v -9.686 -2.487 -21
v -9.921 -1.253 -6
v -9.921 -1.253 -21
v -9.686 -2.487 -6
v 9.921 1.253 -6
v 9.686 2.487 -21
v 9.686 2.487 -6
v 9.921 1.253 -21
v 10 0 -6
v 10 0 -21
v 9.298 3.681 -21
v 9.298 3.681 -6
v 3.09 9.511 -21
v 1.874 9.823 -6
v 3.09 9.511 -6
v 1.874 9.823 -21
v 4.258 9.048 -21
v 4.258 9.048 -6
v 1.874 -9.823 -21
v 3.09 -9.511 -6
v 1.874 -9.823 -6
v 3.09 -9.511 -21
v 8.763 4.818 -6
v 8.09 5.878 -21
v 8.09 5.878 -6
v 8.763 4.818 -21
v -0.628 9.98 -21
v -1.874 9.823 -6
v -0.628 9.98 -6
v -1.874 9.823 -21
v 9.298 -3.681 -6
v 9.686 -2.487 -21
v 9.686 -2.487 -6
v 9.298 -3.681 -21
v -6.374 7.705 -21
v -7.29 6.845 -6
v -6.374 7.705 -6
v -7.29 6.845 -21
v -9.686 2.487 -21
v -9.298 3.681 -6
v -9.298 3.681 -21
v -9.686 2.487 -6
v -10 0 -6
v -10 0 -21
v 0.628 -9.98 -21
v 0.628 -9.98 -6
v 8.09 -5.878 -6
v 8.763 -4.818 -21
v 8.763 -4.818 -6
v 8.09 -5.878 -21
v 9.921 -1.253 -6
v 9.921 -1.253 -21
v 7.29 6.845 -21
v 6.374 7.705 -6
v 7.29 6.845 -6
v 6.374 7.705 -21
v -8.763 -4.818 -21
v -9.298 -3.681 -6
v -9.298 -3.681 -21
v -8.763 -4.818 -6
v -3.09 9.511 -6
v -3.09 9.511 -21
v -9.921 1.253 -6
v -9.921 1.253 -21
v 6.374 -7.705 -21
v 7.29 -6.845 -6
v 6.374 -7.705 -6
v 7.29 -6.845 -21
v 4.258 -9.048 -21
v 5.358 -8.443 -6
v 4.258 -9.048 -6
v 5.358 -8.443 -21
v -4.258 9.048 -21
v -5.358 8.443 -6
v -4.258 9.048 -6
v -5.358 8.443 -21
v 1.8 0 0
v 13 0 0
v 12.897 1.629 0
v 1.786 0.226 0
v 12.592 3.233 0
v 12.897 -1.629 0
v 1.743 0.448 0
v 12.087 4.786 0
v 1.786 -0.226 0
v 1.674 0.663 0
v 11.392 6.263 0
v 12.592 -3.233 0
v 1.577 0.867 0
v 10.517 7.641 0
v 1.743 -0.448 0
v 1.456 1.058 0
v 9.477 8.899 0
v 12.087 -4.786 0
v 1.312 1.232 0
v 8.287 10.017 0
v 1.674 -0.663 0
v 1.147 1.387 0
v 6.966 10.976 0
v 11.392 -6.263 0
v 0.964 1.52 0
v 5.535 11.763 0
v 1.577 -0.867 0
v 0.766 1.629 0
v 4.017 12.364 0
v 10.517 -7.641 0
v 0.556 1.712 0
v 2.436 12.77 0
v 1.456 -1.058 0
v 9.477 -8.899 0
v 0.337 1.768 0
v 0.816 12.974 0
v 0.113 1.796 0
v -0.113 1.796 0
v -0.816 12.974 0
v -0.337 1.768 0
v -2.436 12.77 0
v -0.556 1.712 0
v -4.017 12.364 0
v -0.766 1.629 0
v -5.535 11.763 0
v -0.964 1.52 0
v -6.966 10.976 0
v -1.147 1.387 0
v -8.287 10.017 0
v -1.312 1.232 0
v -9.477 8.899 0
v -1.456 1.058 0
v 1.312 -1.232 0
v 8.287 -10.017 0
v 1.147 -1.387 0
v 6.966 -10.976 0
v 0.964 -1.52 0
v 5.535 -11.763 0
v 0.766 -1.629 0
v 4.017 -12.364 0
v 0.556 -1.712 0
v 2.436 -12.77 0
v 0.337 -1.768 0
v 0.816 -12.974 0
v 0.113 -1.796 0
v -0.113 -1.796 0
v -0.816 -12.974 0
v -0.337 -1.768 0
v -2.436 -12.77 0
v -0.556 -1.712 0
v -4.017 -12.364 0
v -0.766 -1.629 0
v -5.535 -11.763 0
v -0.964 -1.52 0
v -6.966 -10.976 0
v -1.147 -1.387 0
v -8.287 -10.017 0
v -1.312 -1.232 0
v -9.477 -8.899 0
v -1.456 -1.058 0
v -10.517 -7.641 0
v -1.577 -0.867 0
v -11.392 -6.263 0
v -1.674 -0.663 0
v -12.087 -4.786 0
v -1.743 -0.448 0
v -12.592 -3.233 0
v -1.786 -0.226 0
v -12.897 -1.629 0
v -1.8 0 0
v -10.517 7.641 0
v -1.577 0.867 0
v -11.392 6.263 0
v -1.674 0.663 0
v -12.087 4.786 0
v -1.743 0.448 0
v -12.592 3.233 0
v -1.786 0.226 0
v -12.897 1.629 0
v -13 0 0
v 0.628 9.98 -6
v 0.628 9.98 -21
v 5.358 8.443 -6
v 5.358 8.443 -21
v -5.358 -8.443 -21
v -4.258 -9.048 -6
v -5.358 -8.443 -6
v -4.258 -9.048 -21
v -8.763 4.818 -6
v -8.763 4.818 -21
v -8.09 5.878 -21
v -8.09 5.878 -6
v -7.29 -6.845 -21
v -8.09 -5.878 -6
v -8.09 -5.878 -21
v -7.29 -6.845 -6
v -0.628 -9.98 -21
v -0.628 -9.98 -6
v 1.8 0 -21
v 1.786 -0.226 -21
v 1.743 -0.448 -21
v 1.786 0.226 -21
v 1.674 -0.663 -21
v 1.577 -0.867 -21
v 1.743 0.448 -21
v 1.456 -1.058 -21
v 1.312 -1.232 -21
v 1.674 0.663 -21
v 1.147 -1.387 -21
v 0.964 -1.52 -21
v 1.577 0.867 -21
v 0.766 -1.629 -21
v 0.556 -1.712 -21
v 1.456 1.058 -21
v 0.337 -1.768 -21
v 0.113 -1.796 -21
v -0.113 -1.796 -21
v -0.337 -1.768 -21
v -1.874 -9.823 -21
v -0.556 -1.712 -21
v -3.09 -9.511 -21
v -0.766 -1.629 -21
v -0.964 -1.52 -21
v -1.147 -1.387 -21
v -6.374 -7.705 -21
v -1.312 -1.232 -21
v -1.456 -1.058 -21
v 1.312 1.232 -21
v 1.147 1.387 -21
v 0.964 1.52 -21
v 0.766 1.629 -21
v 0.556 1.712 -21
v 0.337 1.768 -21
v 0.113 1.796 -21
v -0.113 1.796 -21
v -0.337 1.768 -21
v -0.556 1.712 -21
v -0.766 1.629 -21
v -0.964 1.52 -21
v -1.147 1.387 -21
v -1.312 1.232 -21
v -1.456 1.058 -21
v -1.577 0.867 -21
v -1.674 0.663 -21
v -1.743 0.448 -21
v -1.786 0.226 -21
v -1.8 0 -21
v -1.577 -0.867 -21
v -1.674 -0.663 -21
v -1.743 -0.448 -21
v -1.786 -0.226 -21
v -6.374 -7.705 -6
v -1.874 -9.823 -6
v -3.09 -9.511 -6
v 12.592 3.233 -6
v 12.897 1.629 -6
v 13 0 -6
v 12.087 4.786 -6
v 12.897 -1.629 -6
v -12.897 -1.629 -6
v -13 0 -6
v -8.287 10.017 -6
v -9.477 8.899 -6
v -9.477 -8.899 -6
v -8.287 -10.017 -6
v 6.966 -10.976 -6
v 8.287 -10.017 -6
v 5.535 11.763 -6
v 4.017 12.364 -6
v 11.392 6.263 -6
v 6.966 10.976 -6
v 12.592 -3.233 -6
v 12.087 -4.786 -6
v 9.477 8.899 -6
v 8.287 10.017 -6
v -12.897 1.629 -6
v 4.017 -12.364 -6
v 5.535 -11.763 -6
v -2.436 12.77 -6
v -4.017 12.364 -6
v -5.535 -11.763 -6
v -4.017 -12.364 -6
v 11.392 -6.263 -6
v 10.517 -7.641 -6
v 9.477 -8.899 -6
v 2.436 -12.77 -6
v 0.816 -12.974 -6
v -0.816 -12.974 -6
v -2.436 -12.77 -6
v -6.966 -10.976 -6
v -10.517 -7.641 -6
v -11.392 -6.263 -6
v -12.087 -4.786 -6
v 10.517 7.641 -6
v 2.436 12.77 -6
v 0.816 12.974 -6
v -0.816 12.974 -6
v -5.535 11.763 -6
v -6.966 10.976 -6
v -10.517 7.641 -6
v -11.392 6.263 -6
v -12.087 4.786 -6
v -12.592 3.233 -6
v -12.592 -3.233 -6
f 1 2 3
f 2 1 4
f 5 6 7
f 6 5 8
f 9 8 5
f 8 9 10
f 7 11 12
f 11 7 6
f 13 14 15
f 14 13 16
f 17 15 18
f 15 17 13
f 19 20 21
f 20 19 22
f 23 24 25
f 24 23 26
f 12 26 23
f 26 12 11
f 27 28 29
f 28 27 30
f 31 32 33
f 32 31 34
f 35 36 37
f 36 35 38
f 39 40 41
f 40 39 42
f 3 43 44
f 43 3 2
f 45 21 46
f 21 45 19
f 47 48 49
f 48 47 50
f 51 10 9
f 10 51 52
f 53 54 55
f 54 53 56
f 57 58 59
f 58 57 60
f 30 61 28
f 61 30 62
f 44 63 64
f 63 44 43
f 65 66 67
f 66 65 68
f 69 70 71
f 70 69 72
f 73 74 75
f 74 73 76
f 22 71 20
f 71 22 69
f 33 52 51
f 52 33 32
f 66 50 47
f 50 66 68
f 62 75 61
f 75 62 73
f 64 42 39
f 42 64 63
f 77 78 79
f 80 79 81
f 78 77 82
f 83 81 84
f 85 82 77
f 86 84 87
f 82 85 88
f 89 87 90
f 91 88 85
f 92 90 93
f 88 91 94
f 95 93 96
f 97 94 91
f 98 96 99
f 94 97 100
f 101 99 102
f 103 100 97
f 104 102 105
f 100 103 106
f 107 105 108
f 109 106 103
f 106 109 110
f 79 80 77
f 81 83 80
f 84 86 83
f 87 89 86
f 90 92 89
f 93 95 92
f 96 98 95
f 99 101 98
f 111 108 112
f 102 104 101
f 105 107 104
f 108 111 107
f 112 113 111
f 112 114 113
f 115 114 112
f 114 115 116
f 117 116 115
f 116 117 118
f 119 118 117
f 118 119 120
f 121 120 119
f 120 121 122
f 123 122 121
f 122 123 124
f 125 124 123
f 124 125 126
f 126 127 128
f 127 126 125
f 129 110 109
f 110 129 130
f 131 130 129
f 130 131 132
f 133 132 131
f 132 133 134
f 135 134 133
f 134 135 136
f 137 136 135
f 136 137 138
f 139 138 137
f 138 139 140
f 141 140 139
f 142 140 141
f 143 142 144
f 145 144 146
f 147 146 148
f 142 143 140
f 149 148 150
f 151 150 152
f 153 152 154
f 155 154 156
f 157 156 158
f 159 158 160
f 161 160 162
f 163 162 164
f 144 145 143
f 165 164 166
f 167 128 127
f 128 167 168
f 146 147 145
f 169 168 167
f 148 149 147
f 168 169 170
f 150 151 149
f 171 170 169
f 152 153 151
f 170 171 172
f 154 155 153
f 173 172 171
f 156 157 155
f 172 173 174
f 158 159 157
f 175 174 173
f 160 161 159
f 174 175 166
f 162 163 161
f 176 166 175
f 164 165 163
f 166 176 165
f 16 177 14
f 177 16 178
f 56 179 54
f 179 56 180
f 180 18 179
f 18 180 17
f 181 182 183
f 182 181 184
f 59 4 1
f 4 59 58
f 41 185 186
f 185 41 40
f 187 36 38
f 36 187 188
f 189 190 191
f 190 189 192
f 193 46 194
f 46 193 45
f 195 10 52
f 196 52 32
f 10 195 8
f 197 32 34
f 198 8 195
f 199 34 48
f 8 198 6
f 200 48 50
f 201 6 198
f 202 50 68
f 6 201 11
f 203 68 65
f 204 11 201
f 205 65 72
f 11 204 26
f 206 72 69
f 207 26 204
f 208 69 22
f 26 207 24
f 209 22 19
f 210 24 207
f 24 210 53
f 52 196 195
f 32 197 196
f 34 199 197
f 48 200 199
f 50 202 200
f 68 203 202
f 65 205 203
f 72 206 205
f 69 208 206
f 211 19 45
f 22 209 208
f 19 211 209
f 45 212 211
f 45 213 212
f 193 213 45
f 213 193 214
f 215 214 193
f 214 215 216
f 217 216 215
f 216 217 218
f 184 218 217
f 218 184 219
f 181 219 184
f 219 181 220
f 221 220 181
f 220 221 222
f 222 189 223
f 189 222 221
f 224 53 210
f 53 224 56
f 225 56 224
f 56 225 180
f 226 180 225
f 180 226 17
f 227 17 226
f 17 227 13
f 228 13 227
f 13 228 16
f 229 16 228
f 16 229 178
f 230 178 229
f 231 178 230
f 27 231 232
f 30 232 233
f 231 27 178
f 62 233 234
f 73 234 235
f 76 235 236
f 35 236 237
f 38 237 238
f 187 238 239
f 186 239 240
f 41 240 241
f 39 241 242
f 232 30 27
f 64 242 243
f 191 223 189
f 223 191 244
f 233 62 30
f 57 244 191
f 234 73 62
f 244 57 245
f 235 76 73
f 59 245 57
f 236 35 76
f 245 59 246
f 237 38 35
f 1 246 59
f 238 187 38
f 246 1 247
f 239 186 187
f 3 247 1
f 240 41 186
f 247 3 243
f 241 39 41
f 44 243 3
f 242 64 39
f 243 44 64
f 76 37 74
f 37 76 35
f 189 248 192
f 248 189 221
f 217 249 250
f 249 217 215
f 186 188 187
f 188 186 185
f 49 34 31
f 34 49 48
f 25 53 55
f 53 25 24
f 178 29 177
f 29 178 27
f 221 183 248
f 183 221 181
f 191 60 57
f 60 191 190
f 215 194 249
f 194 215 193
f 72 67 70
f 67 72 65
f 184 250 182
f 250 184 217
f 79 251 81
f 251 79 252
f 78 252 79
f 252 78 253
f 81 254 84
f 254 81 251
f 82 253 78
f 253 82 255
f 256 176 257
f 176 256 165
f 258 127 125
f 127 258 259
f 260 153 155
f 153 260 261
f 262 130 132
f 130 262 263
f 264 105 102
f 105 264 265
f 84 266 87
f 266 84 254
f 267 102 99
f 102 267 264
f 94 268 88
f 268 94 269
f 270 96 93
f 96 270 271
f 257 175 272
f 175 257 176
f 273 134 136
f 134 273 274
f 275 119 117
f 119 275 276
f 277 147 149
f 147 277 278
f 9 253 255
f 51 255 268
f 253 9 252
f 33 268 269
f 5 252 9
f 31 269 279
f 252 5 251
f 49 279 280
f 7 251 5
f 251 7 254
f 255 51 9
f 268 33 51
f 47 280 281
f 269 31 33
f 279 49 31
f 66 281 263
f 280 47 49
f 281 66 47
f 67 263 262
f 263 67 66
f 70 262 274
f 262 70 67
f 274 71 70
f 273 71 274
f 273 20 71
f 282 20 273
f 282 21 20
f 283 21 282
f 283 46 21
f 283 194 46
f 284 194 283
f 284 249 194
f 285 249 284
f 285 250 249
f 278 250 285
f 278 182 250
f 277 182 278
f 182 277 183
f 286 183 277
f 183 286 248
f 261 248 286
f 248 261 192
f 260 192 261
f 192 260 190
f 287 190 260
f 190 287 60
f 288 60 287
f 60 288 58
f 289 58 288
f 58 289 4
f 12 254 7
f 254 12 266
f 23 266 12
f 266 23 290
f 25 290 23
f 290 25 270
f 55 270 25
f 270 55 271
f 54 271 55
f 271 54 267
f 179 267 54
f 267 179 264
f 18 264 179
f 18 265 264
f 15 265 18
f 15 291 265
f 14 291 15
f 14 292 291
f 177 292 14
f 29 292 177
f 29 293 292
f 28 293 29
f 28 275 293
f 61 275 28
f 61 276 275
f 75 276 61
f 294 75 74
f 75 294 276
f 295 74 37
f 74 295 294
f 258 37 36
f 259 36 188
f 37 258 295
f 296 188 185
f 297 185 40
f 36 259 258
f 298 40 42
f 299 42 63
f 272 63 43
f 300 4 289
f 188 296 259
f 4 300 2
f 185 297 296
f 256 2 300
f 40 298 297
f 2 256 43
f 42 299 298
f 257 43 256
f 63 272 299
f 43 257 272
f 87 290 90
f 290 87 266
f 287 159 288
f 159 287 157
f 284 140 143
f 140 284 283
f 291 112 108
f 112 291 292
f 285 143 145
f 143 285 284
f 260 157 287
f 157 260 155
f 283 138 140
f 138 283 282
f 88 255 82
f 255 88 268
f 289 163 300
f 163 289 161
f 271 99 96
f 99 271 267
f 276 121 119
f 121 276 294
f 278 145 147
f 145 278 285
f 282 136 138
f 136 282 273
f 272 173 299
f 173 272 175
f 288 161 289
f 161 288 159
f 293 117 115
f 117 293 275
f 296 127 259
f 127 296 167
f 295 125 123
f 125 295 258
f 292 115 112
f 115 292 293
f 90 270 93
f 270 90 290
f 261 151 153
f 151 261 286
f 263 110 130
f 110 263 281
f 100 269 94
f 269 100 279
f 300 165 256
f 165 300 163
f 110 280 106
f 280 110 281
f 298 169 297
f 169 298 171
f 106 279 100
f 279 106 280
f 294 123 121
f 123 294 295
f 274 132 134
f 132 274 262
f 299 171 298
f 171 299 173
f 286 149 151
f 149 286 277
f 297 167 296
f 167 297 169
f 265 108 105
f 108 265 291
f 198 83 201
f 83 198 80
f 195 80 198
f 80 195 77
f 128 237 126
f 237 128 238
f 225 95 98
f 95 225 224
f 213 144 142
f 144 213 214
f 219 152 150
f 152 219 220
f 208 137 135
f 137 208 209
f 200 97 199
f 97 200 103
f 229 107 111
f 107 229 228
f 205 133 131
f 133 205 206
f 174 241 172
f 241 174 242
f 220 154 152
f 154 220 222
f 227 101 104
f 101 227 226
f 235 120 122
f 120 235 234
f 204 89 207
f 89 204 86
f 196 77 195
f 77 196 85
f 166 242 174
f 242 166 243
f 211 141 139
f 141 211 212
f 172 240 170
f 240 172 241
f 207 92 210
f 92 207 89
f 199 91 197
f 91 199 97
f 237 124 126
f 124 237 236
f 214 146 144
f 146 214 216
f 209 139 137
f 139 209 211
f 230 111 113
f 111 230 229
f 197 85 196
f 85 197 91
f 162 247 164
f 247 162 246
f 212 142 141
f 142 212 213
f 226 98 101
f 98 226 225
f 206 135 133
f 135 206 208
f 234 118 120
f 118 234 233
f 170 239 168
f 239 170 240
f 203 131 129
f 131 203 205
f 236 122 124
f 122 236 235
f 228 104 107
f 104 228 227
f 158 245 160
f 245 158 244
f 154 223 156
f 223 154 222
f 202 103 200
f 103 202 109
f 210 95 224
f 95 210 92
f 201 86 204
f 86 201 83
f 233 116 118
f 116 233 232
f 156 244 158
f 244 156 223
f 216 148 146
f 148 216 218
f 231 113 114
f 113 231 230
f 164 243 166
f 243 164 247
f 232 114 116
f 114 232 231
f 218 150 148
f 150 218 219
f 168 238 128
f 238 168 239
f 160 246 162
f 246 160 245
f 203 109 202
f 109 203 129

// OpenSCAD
$fn = 50;


difference() {
	union() {
		translate(v = [0, 0, -21.0000000000]) {
			cylinder(h = 21, r = 10.0000000000);
		}
		translate(v = [0, 0, -6.0000000000]) {
			cylinder(h = 6, r = 13.0000000000);
		}
	}
	union() {
		#translate(v = [0, 0, -21]) {
			cylinder(h = 21, r = 1.8000000000);
		}
	}
}
